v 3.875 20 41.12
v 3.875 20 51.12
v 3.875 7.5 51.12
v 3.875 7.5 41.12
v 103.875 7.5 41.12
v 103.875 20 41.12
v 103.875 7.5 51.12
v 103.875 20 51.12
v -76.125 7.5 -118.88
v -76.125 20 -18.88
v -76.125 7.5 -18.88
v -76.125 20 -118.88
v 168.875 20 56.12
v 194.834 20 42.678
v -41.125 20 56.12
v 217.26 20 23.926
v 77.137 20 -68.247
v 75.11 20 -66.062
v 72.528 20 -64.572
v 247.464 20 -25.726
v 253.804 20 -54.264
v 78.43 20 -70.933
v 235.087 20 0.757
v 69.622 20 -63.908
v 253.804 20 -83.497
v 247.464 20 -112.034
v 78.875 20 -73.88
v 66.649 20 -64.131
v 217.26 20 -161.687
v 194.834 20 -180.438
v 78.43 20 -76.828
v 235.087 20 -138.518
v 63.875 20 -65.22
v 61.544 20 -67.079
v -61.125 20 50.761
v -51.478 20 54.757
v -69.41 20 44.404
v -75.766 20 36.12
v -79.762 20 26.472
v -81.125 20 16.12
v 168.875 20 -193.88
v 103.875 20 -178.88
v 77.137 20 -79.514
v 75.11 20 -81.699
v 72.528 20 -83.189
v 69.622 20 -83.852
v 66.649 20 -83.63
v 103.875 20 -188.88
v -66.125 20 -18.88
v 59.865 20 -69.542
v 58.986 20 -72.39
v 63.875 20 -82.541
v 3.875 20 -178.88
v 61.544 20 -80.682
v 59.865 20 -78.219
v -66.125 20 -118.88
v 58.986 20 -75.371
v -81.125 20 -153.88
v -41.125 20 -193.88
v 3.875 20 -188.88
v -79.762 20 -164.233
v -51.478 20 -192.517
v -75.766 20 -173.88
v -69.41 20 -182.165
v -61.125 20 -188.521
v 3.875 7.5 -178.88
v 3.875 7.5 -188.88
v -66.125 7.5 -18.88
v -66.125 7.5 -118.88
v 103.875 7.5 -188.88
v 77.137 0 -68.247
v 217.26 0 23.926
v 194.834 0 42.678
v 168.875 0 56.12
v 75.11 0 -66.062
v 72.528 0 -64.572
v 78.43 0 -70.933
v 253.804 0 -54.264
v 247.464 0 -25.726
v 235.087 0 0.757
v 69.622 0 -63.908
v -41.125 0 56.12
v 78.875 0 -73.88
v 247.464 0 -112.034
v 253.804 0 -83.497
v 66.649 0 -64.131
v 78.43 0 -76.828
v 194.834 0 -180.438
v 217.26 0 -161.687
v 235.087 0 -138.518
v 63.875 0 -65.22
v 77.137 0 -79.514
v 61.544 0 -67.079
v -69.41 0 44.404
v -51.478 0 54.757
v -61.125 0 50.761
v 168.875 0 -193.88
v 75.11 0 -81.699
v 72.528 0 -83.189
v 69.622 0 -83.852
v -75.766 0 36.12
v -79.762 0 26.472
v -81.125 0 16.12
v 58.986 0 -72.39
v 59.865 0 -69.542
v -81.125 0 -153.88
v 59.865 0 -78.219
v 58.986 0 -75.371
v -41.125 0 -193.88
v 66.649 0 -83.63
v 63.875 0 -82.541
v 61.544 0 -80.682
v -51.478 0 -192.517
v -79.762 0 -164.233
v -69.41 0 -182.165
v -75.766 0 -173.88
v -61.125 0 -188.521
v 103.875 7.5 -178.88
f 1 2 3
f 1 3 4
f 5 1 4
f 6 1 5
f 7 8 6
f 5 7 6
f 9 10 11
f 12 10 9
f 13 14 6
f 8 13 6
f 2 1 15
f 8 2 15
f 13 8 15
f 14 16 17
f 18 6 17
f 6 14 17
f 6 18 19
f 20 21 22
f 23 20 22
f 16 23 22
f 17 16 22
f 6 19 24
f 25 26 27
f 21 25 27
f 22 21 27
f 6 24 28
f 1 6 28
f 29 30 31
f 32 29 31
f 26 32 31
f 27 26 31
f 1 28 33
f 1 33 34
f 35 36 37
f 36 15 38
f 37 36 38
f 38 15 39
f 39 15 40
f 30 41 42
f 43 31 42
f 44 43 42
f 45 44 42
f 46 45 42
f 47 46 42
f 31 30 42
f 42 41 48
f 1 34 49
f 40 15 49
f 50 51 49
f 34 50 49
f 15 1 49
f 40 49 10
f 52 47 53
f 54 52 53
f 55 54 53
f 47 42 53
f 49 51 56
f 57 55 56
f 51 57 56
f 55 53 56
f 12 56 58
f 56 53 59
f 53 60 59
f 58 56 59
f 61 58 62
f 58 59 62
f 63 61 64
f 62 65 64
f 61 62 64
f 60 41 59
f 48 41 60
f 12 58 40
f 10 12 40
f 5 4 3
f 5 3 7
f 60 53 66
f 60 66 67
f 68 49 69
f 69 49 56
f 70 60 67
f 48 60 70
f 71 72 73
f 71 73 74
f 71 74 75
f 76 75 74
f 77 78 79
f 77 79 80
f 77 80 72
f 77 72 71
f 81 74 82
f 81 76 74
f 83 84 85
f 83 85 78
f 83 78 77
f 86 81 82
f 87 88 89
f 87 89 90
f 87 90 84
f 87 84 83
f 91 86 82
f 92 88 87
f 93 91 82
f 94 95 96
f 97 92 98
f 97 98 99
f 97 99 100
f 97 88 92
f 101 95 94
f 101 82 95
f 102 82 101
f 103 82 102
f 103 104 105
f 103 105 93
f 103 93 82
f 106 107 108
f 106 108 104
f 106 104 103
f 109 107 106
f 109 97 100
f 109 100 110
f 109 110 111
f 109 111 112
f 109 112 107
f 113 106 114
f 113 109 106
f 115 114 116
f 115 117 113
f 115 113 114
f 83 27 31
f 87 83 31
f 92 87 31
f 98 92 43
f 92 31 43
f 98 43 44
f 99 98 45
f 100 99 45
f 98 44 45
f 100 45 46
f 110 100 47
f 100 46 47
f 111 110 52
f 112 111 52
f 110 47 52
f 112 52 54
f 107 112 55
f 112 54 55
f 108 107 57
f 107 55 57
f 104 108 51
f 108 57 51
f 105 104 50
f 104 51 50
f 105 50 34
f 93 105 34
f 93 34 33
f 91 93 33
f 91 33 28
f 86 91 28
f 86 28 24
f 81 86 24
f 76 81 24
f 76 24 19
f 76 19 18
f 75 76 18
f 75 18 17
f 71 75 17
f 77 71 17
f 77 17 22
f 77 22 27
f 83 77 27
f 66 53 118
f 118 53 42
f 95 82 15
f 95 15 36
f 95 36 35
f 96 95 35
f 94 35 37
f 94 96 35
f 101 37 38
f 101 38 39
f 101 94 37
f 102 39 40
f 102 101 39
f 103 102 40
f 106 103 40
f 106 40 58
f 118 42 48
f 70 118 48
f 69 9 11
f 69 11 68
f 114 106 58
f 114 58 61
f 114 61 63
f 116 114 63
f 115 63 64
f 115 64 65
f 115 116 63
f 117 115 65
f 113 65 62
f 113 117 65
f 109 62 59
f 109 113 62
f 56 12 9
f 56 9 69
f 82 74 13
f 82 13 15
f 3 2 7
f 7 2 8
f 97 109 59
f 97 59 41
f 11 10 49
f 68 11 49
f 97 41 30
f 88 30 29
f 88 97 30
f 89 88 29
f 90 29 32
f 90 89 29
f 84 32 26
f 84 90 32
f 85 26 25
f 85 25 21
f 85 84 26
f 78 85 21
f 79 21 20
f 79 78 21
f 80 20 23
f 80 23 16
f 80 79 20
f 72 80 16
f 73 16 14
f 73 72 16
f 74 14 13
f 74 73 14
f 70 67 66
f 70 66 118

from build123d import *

# Parameters (mm, degrees)
Y_KSEKLIK_EKSTR_ZYON1_DEPTH = 20
IZIM2_W                     = 100
IZIM2_H                     = 10
IZIM2_W_2                   = 10
IZIM2_H_2                   = 100
KES_EKSTR_ZYON1_DEPTH       = 12.5
IZIM4_R                     = 10
KES_EKSTR_ZYON2_DEPTH       = 230.5


with BuildPart() as part:
    # Çizim1 → Yükseklik-Ekstrüzyon1 (new body)
    with BuildSketch(Plane(origin=(0, 0, 0), x_dir=(1, 0, 0), z_dir=(0, 1, 0))):
        with BuildLine():
            Line((-41.125316458, 193.880424863), (168.874683542, 193.880424863))
            ThreePointArc((168.874683542, 193.880424863), (254.603263886, 68.880424863), (168.874683542, -56.119575137))
            Line((168.874683542, -56.119575137), (-41.125316458, -56.119575137))
            ThreePointArc((-41.125316458, -56.119575137), (-69.409587706, -44.403846384), (-81.125316458, -16.119575137))
            Line((-81.125316458, -16.119575137), (-81.125316458, 153.880424863))
            ThreePointArc((-81.125316458, 153.880424863), (-69.409587706, 182.16469611), (-41.125316458, 193.880424863))
        make_face()
    extrude(amount=Y_KSEKLIK_EKSTR_ZYON1_DEPTH)

    # Çizim2 → Kes-Ekstrüzyon1 (cut)
    with BuildSketch(Plane(origin=(0, 20, 0), x_dir=(1, 0, 0), z_dir=(0, 1, 0))):
        with Locations((53.874683542, 183.880424863)):
            Rectangle(IZIM2_W, IZIM2_H)
        with Locations((-71.125316458, 68.880424863)):
            Rectangle(IZIM2_W_2, IZIM2_H_2)
        with Locations((53.874683542, -46.119575137)):
            Rectangle(IZIM2_W, IZIM2_H)
    extrude(amount=-KES_EKSTR_ZYON1_DEPTH, mode=Mode.SUBTRACT)

    # Çizim4 → Kes-Ekstrüzyon2 (cut)
    with BuildSketch(Plane(origin=(0, 20, 0), x_dir=(1, 0, 0), z_dir=(0, 1, 0))):
        with Locations((68.874683542, 73.880424863)):
            Circle(IZIM4_R)
    extrude(amount=-KES_EKSTR_ZYON2_DEPTH, mode=Mode.SUBTRACT)


solid = part.part
